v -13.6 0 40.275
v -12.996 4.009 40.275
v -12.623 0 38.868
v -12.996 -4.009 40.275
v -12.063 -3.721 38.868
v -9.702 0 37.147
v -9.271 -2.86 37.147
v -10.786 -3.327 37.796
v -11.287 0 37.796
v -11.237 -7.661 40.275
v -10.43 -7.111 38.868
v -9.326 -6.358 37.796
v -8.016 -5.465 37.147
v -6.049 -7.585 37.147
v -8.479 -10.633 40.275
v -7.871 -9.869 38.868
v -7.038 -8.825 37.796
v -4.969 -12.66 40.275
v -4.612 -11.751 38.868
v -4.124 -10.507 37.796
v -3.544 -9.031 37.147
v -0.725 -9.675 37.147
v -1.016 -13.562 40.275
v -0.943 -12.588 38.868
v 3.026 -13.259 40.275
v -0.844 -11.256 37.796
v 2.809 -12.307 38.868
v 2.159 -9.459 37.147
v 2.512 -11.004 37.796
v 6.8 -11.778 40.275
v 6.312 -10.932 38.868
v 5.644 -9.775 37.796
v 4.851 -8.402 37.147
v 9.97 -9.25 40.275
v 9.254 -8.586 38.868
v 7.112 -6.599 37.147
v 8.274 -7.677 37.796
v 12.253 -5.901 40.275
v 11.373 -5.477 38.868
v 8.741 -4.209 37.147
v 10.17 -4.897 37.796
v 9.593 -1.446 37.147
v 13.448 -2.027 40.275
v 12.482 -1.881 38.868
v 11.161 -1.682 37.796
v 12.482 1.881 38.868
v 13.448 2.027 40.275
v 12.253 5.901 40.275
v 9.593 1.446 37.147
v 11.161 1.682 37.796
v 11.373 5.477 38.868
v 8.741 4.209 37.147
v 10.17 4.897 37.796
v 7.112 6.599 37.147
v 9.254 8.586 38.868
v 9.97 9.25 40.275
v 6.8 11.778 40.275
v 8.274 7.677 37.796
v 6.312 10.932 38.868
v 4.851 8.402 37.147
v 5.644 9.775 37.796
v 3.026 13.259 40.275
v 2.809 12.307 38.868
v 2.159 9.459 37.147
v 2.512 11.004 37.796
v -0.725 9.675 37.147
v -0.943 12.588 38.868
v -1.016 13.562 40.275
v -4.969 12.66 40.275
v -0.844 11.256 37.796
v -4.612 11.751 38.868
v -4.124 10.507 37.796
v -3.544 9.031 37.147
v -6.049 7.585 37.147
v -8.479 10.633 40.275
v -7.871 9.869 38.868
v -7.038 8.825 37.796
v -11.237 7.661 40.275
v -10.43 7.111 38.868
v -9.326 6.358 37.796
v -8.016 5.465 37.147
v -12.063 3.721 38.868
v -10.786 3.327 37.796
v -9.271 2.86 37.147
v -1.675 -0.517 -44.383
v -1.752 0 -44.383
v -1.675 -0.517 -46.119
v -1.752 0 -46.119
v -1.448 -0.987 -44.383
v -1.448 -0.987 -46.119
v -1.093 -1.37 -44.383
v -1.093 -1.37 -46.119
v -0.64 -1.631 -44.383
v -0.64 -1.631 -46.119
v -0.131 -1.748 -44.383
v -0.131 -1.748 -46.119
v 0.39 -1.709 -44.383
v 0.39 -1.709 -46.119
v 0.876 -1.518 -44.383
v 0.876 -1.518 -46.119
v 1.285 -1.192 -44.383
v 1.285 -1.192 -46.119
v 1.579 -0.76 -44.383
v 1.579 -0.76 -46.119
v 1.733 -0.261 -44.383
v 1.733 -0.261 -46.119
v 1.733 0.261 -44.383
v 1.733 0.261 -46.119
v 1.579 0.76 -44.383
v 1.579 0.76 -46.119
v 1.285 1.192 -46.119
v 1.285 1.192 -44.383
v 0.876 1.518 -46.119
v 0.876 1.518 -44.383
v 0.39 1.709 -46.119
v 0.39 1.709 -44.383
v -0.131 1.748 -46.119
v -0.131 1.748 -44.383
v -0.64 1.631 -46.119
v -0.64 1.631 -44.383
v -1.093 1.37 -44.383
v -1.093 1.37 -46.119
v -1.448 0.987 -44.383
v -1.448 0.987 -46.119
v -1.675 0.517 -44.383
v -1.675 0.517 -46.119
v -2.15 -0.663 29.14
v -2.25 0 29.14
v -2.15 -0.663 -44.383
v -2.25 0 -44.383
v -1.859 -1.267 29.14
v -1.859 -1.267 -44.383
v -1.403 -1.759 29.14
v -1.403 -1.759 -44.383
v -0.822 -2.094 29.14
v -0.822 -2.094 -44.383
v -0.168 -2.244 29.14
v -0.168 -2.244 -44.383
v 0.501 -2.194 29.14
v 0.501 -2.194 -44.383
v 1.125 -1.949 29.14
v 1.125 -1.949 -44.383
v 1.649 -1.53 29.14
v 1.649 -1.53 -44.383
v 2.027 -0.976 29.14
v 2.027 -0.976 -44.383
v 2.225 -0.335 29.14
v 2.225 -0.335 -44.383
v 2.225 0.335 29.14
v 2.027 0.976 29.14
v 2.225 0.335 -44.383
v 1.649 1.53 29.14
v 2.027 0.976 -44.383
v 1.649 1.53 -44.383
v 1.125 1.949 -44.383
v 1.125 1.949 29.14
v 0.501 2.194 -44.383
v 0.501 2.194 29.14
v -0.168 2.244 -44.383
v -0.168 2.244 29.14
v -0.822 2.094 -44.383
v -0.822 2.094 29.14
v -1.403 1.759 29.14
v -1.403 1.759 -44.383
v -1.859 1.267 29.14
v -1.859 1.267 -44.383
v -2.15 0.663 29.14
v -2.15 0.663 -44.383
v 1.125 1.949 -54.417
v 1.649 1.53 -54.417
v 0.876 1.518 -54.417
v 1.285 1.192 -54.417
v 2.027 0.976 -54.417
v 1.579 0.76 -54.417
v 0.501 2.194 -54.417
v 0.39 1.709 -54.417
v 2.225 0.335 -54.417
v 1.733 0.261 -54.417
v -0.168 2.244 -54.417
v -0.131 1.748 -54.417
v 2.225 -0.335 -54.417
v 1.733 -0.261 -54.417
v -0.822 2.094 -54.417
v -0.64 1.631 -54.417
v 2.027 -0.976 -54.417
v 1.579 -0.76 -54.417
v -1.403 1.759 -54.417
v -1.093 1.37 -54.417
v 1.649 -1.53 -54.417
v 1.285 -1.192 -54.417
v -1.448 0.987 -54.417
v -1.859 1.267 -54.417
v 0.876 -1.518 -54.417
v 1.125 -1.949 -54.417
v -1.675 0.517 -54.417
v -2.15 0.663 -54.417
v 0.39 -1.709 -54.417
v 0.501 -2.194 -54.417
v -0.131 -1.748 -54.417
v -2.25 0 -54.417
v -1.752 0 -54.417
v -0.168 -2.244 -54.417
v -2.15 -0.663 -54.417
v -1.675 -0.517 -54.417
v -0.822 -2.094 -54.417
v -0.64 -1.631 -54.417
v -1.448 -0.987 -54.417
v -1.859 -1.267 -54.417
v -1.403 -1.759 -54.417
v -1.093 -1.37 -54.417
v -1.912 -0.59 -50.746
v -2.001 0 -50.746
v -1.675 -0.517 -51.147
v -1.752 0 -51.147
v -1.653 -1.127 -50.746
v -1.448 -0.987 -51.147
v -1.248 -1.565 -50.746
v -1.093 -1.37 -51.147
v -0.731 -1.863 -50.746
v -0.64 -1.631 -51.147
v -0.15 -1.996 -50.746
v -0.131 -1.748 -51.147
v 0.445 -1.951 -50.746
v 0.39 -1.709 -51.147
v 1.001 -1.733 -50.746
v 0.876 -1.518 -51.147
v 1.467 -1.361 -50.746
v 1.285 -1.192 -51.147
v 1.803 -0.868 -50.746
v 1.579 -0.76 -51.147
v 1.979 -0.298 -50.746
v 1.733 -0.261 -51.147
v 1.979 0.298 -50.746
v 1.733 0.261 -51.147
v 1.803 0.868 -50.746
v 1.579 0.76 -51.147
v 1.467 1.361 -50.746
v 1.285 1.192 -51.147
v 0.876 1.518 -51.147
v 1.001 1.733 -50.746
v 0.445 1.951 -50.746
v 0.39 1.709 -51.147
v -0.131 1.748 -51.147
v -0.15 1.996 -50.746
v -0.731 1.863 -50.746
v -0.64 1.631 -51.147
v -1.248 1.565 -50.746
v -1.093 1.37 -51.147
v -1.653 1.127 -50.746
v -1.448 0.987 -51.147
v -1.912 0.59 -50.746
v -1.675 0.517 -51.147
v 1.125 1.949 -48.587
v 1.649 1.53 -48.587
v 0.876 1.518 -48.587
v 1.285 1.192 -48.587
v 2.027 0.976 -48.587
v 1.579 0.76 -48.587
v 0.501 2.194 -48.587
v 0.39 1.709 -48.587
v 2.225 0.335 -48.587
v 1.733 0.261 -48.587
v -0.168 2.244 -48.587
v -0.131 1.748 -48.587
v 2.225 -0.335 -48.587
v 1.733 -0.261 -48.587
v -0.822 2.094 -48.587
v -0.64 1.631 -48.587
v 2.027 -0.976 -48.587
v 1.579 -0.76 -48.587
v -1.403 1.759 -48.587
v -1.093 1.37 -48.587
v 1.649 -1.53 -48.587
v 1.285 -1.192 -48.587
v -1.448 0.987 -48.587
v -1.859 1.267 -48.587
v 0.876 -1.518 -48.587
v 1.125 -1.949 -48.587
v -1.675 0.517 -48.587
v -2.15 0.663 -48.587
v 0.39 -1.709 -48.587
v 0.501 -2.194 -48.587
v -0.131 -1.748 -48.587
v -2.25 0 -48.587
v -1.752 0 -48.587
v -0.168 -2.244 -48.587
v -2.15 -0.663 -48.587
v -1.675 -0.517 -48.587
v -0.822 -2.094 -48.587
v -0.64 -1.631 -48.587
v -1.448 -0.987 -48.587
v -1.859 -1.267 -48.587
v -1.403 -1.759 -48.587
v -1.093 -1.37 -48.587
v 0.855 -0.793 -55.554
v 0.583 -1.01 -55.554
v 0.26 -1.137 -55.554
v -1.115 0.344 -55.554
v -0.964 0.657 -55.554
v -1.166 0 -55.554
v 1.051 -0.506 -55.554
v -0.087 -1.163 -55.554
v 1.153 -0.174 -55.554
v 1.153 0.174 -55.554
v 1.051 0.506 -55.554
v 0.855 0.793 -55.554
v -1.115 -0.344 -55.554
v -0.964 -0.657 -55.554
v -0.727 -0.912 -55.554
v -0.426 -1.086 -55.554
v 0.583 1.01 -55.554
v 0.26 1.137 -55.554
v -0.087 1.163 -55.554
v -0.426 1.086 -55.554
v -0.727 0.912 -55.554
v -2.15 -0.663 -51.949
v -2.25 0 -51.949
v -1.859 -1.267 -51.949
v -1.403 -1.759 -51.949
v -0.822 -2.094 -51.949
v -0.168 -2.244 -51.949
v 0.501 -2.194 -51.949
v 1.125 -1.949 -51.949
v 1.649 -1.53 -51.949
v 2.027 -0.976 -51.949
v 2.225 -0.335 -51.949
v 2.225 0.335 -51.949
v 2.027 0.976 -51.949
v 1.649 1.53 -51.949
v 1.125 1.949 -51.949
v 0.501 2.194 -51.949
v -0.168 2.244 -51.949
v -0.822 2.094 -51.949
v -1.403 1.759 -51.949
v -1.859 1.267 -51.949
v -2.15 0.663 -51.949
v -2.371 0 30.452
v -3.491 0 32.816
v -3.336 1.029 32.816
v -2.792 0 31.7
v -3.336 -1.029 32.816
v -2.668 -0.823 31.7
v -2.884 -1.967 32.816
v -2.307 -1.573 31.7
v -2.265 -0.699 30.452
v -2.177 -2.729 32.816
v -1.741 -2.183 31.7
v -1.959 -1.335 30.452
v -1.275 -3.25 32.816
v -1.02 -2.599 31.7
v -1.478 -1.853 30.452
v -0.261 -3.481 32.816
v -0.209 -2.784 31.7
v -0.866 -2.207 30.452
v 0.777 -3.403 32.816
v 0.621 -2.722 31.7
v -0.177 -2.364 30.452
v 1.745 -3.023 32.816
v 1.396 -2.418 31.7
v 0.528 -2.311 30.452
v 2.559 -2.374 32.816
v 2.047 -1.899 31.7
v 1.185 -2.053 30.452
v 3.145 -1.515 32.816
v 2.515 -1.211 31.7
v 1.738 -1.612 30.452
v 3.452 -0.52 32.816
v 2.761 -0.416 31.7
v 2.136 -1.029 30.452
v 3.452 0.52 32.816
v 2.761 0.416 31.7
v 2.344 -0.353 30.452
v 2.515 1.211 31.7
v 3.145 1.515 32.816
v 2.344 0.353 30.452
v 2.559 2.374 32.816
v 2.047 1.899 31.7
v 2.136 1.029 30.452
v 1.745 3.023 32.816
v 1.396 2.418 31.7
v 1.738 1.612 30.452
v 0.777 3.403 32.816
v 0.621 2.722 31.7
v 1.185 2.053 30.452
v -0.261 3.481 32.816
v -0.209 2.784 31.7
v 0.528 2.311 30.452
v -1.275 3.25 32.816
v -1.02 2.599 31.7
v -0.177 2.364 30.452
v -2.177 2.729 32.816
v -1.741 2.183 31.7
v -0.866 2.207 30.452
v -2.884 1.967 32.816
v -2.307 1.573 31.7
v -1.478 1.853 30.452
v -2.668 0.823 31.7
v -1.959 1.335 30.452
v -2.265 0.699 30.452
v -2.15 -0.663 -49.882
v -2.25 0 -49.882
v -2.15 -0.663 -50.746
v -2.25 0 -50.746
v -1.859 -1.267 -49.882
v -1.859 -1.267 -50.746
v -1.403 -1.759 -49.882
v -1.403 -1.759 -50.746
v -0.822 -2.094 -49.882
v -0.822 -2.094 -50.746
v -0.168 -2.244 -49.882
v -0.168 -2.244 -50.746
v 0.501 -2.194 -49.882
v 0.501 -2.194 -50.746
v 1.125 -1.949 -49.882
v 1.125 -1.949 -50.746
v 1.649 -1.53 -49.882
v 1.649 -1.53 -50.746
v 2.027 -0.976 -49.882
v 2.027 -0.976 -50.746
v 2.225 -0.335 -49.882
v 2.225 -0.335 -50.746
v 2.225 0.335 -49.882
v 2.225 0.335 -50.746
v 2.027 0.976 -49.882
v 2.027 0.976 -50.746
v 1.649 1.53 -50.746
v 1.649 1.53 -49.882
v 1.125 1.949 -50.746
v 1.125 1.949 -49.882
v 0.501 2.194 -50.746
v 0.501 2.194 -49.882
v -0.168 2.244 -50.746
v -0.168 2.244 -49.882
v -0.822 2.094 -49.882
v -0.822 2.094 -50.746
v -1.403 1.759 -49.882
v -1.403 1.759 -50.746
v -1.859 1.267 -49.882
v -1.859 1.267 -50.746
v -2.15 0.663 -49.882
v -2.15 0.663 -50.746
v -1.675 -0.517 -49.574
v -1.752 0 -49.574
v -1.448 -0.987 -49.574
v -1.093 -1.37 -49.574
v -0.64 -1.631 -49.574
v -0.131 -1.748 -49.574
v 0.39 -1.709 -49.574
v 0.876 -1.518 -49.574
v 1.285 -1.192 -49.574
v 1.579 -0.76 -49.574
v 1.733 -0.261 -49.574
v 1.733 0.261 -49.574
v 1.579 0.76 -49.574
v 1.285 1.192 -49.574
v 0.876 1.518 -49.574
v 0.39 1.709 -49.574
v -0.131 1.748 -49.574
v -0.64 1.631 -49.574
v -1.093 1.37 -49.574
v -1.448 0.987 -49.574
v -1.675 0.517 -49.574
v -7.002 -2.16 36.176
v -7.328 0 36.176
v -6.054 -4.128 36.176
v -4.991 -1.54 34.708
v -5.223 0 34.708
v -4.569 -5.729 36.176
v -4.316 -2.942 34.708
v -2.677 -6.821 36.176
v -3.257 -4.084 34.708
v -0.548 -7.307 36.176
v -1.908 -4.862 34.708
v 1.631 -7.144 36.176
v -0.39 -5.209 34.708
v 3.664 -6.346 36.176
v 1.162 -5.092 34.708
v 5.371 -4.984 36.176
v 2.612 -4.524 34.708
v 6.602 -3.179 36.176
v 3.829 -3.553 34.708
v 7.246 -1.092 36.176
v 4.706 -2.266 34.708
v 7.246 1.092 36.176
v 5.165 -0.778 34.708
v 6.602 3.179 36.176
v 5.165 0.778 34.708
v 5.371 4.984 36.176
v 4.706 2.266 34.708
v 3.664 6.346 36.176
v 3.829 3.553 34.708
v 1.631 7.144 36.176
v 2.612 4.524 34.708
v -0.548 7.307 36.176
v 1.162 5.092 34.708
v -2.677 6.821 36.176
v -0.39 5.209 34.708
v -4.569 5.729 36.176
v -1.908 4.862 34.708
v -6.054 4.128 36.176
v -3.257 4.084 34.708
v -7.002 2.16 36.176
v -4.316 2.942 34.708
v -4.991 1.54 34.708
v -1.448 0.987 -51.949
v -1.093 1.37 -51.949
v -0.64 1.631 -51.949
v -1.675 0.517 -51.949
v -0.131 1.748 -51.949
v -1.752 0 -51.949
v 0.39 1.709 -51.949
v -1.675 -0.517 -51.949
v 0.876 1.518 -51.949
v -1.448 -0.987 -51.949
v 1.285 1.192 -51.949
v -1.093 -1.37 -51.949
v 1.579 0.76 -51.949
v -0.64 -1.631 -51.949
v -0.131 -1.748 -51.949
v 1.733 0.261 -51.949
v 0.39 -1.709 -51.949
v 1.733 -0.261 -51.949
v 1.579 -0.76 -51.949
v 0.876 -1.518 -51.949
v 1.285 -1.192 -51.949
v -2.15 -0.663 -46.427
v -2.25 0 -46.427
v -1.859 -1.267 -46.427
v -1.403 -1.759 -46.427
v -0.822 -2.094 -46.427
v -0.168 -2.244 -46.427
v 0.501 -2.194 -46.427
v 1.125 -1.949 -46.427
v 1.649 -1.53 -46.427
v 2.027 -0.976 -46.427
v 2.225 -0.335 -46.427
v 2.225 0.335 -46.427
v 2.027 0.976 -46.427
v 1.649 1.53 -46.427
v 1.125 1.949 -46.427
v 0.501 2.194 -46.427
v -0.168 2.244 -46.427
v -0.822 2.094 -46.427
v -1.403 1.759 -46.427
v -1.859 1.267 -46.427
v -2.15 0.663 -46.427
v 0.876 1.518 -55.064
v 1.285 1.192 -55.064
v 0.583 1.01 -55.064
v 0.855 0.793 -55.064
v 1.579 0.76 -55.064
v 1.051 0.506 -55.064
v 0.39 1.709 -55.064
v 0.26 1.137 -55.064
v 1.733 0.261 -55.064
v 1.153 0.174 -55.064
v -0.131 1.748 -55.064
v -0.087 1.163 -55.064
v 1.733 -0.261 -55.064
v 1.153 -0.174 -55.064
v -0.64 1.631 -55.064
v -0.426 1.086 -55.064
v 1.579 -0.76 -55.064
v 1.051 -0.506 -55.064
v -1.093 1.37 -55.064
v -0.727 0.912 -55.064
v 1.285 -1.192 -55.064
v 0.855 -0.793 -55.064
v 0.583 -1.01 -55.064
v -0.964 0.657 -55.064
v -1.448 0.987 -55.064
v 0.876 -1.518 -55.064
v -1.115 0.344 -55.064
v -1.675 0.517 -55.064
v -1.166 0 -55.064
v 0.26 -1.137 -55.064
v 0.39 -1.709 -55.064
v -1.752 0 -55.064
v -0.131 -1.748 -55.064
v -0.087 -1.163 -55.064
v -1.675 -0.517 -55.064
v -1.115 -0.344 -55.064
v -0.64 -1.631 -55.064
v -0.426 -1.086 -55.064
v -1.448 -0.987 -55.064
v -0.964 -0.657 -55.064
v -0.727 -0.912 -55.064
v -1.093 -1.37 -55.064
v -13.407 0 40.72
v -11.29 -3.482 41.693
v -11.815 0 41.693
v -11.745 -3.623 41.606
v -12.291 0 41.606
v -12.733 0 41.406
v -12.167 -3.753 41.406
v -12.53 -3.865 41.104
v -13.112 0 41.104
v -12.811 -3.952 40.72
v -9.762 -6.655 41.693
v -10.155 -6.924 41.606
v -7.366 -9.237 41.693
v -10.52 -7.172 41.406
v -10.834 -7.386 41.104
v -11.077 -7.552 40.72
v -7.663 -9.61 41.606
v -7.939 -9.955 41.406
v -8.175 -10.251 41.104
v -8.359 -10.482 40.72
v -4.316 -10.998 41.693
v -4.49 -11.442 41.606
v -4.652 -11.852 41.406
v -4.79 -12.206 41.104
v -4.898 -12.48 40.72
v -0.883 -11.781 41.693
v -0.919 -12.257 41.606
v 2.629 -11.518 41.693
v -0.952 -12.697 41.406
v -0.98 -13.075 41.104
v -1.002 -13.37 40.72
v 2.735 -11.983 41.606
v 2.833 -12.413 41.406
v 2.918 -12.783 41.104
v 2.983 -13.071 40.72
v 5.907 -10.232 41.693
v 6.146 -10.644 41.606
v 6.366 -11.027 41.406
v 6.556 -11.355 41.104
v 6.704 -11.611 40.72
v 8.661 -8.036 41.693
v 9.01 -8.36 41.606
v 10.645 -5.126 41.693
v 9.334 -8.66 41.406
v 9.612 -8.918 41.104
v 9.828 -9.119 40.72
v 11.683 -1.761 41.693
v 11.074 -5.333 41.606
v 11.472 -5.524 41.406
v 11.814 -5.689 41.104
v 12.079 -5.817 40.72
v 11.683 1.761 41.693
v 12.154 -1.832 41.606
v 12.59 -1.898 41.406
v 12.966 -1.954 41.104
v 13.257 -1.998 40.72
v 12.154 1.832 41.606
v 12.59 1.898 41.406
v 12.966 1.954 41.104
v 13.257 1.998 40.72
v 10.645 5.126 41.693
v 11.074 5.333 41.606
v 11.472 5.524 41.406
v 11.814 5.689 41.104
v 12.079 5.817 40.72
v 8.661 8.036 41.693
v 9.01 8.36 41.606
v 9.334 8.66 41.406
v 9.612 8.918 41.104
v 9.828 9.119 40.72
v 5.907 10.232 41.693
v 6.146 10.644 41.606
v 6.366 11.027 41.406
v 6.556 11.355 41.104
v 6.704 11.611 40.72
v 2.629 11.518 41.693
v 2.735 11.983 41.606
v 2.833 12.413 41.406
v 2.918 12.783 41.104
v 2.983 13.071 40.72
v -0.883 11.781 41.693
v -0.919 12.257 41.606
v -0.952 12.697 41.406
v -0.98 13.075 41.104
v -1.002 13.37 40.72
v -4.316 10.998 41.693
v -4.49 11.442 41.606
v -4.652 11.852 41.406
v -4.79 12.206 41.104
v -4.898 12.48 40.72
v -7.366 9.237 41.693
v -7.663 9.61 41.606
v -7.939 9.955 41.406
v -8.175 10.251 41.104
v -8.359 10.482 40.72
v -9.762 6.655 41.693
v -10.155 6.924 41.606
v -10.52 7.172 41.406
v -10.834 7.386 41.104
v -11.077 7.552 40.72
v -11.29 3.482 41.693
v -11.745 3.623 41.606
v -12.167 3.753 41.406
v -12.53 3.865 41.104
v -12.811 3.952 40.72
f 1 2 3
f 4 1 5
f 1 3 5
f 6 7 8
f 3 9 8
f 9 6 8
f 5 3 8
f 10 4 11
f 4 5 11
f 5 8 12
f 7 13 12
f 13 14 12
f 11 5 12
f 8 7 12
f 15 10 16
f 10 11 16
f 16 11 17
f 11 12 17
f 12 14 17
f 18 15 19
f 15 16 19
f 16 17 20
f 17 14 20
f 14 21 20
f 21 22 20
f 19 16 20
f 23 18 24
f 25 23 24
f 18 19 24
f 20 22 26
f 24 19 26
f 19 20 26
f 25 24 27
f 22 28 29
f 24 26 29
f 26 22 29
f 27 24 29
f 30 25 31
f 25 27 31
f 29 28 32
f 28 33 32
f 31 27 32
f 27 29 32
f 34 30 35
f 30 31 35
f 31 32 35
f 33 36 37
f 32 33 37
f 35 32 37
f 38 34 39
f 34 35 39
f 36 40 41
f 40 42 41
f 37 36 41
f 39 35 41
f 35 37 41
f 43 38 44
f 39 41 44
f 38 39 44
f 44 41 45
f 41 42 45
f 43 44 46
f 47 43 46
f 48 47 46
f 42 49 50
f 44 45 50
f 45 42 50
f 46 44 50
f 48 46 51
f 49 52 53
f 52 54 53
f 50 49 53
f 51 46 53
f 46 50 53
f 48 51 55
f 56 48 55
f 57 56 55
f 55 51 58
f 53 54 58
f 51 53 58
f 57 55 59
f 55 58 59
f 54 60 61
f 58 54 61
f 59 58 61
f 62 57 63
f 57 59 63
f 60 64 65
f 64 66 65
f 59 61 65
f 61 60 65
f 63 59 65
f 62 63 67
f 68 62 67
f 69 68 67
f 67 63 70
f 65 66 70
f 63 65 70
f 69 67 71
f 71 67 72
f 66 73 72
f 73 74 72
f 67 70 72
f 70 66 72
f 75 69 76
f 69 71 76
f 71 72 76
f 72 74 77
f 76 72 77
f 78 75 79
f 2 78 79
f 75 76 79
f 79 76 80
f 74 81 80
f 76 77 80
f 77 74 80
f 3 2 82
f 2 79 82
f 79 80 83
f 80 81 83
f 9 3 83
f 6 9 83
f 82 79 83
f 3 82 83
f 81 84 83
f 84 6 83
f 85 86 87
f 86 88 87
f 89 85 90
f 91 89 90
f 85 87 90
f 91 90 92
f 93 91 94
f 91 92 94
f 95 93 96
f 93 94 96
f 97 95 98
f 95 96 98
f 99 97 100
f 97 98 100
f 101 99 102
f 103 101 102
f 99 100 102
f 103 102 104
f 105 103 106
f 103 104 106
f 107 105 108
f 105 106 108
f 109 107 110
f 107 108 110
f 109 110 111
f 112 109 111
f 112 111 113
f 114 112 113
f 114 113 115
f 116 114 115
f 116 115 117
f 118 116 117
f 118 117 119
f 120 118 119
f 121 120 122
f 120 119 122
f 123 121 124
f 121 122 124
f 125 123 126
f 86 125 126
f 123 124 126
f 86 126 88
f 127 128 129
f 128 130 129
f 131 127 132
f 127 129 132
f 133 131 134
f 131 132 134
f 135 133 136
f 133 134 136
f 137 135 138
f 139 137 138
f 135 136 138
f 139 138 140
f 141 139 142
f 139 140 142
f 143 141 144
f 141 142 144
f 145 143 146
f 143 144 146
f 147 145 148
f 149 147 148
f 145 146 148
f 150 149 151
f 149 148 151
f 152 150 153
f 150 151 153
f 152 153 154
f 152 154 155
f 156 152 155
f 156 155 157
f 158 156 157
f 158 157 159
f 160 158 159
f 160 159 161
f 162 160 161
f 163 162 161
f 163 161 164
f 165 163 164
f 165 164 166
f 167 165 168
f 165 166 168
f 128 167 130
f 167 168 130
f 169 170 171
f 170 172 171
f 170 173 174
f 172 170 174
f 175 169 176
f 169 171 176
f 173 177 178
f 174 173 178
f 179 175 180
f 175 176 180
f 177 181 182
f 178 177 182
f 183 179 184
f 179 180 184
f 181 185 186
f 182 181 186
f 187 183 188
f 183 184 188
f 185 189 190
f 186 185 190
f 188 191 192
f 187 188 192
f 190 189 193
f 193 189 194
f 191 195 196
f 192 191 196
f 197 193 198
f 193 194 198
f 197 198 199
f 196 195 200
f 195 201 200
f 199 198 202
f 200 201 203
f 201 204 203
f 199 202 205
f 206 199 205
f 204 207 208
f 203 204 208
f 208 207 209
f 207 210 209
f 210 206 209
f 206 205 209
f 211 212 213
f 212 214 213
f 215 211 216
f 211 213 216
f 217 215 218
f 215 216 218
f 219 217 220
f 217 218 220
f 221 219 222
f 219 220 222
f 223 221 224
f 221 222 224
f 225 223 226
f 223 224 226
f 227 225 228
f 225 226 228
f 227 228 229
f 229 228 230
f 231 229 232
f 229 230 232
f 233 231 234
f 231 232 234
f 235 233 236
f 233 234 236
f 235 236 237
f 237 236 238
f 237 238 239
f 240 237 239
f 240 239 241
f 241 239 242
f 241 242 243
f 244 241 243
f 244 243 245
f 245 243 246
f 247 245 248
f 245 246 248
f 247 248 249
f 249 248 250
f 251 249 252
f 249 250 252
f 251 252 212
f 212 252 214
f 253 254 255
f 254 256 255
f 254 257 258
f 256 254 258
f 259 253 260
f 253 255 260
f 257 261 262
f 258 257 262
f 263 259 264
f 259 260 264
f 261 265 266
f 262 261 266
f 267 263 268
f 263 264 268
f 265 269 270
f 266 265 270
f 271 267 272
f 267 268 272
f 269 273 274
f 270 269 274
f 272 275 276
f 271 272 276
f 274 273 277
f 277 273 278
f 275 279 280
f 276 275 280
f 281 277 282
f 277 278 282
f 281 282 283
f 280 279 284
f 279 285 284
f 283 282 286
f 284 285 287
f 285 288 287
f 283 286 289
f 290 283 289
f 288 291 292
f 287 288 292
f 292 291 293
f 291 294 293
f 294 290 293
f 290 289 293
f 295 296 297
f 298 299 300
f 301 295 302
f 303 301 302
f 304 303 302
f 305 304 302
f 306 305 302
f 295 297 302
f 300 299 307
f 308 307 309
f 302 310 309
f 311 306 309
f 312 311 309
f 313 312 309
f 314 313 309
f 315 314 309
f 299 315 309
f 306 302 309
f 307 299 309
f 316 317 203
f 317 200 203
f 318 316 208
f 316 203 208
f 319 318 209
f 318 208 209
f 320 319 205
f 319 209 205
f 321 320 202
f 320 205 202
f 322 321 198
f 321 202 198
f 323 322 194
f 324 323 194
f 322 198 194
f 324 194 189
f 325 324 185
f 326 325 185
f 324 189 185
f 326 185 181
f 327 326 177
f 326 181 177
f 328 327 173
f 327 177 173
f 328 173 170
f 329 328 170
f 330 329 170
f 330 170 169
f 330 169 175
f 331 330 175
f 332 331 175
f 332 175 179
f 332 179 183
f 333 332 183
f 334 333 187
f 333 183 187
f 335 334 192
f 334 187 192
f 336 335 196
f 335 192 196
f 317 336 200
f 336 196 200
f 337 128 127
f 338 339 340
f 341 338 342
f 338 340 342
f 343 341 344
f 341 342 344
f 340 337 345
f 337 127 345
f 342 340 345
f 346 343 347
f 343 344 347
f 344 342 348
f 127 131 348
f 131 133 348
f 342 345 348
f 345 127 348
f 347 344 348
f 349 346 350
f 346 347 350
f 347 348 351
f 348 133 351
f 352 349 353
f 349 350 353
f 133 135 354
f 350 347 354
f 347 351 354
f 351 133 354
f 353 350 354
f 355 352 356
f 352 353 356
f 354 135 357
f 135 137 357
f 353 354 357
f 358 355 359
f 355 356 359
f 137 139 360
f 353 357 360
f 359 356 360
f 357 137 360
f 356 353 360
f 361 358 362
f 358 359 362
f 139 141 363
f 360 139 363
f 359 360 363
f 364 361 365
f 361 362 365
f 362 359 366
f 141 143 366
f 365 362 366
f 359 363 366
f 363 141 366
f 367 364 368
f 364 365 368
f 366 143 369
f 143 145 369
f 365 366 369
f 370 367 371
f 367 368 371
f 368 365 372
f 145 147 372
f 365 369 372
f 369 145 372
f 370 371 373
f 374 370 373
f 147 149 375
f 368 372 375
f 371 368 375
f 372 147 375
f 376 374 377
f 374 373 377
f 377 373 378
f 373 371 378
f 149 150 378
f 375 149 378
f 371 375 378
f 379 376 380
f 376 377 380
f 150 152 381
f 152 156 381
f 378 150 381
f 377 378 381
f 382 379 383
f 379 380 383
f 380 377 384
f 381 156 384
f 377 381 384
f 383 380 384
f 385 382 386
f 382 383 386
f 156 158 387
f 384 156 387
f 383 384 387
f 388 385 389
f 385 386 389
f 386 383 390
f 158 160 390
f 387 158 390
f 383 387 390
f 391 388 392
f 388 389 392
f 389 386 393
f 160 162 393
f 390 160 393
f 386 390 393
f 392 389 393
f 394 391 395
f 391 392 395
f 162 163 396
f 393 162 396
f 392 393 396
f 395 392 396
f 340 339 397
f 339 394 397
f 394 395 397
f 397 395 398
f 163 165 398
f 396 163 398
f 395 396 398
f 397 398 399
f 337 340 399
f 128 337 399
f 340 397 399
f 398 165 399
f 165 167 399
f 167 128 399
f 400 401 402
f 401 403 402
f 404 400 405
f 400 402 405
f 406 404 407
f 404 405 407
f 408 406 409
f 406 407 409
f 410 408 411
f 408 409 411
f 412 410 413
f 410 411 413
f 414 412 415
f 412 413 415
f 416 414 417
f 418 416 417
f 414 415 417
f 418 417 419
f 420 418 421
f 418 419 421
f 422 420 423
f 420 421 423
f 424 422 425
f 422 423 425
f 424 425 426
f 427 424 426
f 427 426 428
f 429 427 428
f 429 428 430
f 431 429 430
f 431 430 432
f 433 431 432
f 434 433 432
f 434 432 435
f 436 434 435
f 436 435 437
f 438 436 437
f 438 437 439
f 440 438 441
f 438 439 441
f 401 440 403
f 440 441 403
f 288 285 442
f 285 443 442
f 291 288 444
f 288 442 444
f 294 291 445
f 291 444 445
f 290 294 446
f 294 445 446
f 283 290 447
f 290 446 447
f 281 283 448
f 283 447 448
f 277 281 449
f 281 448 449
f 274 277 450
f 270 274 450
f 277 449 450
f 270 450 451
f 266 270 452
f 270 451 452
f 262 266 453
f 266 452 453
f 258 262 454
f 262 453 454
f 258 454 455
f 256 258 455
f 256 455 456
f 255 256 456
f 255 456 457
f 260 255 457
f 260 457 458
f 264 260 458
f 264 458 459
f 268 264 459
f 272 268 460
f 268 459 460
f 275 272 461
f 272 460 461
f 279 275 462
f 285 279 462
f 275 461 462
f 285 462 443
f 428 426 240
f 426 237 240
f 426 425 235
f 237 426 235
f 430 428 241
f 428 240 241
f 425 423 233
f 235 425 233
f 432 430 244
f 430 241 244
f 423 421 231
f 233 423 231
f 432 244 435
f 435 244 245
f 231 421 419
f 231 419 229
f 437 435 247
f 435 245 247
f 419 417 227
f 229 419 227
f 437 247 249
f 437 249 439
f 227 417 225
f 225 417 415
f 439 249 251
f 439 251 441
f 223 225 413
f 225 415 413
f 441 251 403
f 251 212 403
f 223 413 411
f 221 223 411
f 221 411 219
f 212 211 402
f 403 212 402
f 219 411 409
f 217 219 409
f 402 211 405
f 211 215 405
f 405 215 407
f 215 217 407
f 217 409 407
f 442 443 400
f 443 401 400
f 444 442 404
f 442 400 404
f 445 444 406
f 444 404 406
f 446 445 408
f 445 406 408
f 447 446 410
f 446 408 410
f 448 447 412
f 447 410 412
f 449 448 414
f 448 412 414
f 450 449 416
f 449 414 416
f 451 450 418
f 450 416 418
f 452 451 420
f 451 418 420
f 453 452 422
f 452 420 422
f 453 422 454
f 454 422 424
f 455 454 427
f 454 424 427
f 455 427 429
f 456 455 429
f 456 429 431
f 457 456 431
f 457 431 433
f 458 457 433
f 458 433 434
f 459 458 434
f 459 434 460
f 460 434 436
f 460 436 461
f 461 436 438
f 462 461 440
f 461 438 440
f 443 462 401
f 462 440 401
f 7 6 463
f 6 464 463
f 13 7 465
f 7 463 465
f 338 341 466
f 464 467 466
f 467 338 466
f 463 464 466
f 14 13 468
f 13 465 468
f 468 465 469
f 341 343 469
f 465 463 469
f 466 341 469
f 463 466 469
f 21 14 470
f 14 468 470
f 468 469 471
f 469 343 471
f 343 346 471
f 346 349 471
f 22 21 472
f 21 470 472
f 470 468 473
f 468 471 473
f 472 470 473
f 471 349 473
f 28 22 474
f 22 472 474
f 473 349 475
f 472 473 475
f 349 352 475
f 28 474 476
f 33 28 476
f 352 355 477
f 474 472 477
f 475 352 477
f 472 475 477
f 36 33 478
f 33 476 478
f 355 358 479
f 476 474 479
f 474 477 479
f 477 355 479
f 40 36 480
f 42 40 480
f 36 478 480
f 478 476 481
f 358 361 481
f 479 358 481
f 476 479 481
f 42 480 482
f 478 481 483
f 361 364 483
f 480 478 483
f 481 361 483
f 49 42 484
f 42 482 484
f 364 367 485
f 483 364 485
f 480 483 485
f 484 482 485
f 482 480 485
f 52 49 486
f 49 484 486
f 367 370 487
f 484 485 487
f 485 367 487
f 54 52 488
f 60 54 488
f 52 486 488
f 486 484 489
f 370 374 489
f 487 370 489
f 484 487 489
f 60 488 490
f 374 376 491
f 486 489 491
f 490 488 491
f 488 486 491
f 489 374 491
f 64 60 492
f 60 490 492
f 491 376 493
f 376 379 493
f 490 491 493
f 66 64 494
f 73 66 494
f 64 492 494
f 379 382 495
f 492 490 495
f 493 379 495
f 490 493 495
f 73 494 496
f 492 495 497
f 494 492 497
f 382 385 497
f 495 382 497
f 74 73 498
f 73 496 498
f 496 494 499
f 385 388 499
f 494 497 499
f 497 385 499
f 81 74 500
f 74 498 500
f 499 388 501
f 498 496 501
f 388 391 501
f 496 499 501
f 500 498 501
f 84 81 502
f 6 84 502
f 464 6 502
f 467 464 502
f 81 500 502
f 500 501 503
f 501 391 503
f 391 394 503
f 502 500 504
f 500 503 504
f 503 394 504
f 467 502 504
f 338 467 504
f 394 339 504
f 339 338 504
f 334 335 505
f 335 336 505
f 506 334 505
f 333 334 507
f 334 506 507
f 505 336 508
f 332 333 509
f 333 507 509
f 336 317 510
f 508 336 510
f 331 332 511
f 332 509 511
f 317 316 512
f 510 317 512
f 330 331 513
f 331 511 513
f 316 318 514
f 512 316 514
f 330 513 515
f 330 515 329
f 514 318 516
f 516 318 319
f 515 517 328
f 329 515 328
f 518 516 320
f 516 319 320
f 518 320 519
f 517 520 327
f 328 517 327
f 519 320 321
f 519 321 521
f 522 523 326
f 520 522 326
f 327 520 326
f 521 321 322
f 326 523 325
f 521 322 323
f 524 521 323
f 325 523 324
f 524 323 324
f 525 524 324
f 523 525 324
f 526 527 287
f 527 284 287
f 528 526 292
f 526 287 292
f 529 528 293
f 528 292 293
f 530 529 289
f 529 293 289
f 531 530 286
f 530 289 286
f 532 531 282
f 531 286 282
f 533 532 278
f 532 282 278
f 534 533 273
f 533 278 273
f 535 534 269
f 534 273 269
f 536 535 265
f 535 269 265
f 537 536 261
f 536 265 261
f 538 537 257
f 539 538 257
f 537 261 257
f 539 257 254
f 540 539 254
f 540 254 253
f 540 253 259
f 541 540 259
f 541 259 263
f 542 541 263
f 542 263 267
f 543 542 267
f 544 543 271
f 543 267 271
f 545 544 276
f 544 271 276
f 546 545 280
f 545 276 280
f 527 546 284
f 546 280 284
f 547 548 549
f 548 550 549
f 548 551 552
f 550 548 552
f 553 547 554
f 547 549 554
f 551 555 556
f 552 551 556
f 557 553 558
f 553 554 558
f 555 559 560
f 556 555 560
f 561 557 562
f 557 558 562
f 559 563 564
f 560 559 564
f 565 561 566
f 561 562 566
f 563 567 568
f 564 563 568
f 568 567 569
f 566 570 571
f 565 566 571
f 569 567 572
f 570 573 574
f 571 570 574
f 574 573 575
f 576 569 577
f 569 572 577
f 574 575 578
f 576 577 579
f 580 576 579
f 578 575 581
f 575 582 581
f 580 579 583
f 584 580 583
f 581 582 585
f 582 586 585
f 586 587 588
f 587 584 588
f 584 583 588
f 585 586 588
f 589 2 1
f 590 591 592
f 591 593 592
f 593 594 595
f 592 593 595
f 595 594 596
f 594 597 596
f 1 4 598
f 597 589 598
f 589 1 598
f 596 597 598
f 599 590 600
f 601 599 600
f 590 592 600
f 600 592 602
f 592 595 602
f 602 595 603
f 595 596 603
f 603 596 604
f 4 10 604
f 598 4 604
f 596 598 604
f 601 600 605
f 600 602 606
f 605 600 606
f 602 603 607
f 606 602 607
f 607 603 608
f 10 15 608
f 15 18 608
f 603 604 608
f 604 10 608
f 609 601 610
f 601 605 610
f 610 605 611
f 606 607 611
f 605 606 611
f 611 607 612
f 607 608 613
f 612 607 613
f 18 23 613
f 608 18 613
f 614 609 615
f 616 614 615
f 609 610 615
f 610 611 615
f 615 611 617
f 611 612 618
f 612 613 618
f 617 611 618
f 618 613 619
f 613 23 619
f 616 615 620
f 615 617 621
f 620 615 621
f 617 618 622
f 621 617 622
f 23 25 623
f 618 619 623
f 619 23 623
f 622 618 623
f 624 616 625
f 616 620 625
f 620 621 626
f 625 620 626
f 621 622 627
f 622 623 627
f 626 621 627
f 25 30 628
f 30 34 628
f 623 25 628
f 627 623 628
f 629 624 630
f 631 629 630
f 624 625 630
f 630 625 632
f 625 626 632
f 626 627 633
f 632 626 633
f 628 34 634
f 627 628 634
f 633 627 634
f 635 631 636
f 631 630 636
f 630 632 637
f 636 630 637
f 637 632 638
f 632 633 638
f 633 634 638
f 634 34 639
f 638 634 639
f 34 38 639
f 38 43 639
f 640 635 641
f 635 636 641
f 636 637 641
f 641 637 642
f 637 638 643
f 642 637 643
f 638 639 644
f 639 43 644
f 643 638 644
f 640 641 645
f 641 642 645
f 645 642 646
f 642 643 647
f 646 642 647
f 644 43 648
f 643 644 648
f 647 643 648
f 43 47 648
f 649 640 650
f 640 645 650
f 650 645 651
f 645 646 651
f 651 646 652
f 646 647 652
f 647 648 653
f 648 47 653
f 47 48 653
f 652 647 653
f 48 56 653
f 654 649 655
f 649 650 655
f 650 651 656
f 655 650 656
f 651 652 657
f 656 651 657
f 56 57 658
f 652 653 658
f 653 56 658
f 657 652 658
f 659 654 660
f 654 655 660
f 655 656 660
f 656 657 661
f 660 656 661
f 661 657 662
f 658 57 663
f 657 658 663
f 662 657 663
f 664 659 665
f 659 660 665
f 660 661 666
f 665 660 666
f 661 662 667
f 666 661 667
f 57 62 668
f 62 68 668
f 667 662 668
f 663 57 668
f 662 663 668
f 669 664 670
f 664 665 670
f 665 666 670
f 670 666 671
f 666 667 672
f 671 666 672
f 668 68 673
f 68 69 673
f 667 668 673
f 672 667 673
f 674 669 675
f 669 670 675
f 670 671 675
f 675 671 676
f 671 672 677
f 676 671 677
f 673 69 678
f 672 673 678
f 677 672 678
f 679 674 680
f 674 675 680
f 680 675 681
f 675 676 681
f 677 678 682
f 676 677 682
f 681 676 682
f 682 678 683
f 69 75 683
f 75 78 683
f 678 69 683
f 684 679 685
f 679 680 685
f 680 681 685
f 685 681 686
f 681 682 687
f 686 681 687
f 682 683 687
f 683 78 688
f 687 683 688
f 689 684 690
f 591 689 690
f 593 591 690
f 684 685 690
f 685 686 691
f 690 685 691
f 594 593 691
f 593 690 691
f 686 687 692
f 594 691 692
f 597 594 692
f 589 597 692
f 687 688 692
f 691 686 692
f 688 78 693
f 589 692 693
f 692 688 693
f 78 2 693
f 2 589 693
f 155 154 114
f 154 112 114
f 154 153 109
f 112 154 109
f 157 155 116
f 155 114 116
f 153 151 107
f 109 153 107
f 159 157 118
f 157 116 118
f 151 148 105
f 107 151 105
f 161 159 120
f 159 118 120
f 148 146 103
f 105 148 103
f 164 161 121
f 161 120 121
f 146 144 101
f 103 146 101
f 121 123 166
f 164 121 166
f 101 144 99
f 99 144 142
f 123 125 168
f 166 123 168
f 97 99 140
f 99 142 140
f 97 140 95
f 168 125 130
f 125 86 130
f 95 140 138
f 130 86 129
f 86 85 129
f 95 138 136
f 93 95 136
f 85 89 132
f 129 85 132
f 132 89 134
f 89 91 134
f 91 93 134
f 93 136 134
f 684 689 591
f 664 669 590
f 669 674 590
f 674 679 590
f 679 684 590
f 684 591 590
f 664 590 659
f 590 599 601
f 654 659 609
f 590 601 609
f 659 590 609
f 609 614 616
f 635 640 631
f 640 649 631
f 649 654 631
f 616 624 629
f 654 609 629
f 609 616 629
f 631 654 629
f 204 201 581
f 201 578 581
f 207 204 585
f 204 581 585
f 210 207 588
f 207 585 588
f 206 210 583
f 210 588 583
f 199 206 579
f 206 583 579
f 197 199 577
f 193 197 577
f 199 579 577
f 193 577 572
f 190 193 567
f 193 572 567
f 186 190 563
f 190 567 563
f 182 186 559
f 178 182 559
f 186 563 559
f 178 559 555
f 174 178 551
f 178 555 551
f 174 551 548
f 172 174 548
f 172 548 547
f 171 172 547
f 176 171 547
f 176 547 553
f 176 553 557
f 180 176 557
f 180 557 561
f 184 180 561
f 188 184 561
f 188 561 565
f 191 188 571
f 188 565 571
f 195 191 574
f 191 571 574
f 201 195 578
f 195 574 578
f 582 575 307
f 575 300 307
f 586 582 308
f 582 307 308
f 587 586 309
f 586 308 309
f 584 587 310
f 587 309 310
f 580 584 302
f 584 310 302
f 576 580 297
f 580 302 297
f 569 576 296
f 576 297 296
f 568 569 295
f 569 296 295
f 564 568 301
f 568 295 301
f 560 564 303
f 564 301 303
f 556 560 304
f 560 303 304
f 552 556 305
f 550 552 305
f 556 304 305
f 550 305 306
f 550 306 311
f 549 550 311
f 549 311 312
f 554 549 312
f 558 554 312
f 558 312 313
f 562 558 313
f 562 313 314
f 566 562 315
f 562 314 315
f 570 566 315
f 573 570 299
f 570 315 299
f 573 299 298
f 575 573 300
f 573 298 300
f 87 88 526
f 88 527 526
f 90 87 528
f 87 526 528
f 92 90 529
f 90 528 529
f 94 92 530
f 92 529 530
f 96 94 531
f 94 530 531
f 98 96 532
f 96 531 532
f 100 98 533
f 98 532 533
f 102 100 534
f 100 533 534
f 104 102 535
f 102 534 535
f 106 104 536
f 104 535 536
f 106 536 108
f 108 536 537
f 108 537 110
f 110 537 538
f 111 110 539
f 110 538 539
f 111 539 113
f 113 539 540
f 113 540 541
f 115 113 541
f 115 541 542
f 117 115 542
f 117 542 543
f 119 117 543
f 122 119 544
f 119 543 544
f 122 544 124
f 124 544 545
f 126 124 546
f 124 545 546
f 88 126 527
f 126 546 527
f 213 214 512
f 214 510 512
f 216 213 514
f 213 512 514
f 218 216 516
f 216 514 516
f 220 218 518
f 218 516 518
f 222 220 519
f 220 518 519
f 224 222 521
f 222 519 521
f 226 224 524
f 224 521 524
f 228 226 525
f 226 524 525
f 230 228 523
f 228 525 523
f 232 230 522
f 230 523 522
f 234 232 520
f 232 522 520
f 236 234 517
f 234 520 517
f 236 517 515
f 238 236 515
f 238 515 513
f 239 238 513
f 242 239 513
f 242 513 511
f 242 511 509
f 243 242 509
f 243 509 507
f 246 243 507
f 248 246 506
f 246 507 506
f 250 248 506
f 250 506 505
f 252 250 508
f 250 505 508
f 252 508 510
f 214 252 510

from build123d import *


with BuildPart() as part:
    # Sketch1 → Revolve1 (revolve)
    with BuildSketch(Plane(origin=(0, 0, 0), x_dir=(0, 0, -1), z_dir=(1, 0, 0)), mode=Mode.PRIVATE) as revolve1_sk:
        with BuildLine():
            Line((55.553509337, 0), (-41.692666331, 0))
            Line((-41.692666331, 0), (-41.692666331, 11.814520799))
            ThreePointArc((-41.692666331, 11.814520799), (-41.266642905, 12.931534366), (-40.275497627, 13.6))
            ThreePointArc((-40.275497627, 13.6), (-38.283752535, 11.994111634), (-37.147345345, 9.701841002))
            ThreePointArc((-37.147345345, 9.701841002), (-35.499987602, 6.234951959), (-32.81605757, 3.490935421))
            ThreePointArc((-32.81605757, 3.490935421), (-31.088013134, 2.544687339), (-29.140018683, 2.25))
            Line((-29.140018683, 2.25), (44.382638792, 2.25))
            Line((44.382638792, 2.25), (44.382638792, 1.752462307))
            Line((44.382638792, 1.752462307), (46.11897024, 1.752462307))
            Line((46.11897024, 1.752462307), (46.427430207, 2.25))
            Line((46.427430207, 2.25), (48.58664997, 2.25))
            Line((48.58664997, 2.25), (48.58664997, 1.752462307))
            Line((48.58664997, 1.752462307), (49.573721861, 1.752462307))
            Line((49.573721861, 1.752462307), (49.882181827, 2.25))
            Line((49.882181827, 2.25), (50.745869733, 2.25))
            Line((50.745869733, 2.25), (50.745869733, 2.001231153))
            Line((50.745869733, 2.001231153), (51.147127243, 1.752462307))
            Line((51.147127243, 1.752462307), (51.948863601, 1.752462307))
            Line((51.948863601, 1.752462307), (51.948863601, 2.25))
            Line((51.948863601, 2.25), (54.41654333, 2.25))
            Line((54.41654333, 2.25), (54.41654333, 1.752462307))
            Line((54.41654333, 1.752462307), (55.064309259, 1.752462307))
            Line((55.064309259, 1.752462307), (55.064309259, 1.166388371))
            Line((55.064309259, 1.166388371), (55.553509337, 1.166388371))
            Line((55.553509337, 1.166388371), (55.553509337, 0))
        make_face()
    revolve(revolve1_sk.sketch.rotate(Axis((0, 0, -55.553509337), (0, 0, 1)), 90), axis=Axis((0, 0, -55.553509337), (0, 0, 1)))


solid = part.part
